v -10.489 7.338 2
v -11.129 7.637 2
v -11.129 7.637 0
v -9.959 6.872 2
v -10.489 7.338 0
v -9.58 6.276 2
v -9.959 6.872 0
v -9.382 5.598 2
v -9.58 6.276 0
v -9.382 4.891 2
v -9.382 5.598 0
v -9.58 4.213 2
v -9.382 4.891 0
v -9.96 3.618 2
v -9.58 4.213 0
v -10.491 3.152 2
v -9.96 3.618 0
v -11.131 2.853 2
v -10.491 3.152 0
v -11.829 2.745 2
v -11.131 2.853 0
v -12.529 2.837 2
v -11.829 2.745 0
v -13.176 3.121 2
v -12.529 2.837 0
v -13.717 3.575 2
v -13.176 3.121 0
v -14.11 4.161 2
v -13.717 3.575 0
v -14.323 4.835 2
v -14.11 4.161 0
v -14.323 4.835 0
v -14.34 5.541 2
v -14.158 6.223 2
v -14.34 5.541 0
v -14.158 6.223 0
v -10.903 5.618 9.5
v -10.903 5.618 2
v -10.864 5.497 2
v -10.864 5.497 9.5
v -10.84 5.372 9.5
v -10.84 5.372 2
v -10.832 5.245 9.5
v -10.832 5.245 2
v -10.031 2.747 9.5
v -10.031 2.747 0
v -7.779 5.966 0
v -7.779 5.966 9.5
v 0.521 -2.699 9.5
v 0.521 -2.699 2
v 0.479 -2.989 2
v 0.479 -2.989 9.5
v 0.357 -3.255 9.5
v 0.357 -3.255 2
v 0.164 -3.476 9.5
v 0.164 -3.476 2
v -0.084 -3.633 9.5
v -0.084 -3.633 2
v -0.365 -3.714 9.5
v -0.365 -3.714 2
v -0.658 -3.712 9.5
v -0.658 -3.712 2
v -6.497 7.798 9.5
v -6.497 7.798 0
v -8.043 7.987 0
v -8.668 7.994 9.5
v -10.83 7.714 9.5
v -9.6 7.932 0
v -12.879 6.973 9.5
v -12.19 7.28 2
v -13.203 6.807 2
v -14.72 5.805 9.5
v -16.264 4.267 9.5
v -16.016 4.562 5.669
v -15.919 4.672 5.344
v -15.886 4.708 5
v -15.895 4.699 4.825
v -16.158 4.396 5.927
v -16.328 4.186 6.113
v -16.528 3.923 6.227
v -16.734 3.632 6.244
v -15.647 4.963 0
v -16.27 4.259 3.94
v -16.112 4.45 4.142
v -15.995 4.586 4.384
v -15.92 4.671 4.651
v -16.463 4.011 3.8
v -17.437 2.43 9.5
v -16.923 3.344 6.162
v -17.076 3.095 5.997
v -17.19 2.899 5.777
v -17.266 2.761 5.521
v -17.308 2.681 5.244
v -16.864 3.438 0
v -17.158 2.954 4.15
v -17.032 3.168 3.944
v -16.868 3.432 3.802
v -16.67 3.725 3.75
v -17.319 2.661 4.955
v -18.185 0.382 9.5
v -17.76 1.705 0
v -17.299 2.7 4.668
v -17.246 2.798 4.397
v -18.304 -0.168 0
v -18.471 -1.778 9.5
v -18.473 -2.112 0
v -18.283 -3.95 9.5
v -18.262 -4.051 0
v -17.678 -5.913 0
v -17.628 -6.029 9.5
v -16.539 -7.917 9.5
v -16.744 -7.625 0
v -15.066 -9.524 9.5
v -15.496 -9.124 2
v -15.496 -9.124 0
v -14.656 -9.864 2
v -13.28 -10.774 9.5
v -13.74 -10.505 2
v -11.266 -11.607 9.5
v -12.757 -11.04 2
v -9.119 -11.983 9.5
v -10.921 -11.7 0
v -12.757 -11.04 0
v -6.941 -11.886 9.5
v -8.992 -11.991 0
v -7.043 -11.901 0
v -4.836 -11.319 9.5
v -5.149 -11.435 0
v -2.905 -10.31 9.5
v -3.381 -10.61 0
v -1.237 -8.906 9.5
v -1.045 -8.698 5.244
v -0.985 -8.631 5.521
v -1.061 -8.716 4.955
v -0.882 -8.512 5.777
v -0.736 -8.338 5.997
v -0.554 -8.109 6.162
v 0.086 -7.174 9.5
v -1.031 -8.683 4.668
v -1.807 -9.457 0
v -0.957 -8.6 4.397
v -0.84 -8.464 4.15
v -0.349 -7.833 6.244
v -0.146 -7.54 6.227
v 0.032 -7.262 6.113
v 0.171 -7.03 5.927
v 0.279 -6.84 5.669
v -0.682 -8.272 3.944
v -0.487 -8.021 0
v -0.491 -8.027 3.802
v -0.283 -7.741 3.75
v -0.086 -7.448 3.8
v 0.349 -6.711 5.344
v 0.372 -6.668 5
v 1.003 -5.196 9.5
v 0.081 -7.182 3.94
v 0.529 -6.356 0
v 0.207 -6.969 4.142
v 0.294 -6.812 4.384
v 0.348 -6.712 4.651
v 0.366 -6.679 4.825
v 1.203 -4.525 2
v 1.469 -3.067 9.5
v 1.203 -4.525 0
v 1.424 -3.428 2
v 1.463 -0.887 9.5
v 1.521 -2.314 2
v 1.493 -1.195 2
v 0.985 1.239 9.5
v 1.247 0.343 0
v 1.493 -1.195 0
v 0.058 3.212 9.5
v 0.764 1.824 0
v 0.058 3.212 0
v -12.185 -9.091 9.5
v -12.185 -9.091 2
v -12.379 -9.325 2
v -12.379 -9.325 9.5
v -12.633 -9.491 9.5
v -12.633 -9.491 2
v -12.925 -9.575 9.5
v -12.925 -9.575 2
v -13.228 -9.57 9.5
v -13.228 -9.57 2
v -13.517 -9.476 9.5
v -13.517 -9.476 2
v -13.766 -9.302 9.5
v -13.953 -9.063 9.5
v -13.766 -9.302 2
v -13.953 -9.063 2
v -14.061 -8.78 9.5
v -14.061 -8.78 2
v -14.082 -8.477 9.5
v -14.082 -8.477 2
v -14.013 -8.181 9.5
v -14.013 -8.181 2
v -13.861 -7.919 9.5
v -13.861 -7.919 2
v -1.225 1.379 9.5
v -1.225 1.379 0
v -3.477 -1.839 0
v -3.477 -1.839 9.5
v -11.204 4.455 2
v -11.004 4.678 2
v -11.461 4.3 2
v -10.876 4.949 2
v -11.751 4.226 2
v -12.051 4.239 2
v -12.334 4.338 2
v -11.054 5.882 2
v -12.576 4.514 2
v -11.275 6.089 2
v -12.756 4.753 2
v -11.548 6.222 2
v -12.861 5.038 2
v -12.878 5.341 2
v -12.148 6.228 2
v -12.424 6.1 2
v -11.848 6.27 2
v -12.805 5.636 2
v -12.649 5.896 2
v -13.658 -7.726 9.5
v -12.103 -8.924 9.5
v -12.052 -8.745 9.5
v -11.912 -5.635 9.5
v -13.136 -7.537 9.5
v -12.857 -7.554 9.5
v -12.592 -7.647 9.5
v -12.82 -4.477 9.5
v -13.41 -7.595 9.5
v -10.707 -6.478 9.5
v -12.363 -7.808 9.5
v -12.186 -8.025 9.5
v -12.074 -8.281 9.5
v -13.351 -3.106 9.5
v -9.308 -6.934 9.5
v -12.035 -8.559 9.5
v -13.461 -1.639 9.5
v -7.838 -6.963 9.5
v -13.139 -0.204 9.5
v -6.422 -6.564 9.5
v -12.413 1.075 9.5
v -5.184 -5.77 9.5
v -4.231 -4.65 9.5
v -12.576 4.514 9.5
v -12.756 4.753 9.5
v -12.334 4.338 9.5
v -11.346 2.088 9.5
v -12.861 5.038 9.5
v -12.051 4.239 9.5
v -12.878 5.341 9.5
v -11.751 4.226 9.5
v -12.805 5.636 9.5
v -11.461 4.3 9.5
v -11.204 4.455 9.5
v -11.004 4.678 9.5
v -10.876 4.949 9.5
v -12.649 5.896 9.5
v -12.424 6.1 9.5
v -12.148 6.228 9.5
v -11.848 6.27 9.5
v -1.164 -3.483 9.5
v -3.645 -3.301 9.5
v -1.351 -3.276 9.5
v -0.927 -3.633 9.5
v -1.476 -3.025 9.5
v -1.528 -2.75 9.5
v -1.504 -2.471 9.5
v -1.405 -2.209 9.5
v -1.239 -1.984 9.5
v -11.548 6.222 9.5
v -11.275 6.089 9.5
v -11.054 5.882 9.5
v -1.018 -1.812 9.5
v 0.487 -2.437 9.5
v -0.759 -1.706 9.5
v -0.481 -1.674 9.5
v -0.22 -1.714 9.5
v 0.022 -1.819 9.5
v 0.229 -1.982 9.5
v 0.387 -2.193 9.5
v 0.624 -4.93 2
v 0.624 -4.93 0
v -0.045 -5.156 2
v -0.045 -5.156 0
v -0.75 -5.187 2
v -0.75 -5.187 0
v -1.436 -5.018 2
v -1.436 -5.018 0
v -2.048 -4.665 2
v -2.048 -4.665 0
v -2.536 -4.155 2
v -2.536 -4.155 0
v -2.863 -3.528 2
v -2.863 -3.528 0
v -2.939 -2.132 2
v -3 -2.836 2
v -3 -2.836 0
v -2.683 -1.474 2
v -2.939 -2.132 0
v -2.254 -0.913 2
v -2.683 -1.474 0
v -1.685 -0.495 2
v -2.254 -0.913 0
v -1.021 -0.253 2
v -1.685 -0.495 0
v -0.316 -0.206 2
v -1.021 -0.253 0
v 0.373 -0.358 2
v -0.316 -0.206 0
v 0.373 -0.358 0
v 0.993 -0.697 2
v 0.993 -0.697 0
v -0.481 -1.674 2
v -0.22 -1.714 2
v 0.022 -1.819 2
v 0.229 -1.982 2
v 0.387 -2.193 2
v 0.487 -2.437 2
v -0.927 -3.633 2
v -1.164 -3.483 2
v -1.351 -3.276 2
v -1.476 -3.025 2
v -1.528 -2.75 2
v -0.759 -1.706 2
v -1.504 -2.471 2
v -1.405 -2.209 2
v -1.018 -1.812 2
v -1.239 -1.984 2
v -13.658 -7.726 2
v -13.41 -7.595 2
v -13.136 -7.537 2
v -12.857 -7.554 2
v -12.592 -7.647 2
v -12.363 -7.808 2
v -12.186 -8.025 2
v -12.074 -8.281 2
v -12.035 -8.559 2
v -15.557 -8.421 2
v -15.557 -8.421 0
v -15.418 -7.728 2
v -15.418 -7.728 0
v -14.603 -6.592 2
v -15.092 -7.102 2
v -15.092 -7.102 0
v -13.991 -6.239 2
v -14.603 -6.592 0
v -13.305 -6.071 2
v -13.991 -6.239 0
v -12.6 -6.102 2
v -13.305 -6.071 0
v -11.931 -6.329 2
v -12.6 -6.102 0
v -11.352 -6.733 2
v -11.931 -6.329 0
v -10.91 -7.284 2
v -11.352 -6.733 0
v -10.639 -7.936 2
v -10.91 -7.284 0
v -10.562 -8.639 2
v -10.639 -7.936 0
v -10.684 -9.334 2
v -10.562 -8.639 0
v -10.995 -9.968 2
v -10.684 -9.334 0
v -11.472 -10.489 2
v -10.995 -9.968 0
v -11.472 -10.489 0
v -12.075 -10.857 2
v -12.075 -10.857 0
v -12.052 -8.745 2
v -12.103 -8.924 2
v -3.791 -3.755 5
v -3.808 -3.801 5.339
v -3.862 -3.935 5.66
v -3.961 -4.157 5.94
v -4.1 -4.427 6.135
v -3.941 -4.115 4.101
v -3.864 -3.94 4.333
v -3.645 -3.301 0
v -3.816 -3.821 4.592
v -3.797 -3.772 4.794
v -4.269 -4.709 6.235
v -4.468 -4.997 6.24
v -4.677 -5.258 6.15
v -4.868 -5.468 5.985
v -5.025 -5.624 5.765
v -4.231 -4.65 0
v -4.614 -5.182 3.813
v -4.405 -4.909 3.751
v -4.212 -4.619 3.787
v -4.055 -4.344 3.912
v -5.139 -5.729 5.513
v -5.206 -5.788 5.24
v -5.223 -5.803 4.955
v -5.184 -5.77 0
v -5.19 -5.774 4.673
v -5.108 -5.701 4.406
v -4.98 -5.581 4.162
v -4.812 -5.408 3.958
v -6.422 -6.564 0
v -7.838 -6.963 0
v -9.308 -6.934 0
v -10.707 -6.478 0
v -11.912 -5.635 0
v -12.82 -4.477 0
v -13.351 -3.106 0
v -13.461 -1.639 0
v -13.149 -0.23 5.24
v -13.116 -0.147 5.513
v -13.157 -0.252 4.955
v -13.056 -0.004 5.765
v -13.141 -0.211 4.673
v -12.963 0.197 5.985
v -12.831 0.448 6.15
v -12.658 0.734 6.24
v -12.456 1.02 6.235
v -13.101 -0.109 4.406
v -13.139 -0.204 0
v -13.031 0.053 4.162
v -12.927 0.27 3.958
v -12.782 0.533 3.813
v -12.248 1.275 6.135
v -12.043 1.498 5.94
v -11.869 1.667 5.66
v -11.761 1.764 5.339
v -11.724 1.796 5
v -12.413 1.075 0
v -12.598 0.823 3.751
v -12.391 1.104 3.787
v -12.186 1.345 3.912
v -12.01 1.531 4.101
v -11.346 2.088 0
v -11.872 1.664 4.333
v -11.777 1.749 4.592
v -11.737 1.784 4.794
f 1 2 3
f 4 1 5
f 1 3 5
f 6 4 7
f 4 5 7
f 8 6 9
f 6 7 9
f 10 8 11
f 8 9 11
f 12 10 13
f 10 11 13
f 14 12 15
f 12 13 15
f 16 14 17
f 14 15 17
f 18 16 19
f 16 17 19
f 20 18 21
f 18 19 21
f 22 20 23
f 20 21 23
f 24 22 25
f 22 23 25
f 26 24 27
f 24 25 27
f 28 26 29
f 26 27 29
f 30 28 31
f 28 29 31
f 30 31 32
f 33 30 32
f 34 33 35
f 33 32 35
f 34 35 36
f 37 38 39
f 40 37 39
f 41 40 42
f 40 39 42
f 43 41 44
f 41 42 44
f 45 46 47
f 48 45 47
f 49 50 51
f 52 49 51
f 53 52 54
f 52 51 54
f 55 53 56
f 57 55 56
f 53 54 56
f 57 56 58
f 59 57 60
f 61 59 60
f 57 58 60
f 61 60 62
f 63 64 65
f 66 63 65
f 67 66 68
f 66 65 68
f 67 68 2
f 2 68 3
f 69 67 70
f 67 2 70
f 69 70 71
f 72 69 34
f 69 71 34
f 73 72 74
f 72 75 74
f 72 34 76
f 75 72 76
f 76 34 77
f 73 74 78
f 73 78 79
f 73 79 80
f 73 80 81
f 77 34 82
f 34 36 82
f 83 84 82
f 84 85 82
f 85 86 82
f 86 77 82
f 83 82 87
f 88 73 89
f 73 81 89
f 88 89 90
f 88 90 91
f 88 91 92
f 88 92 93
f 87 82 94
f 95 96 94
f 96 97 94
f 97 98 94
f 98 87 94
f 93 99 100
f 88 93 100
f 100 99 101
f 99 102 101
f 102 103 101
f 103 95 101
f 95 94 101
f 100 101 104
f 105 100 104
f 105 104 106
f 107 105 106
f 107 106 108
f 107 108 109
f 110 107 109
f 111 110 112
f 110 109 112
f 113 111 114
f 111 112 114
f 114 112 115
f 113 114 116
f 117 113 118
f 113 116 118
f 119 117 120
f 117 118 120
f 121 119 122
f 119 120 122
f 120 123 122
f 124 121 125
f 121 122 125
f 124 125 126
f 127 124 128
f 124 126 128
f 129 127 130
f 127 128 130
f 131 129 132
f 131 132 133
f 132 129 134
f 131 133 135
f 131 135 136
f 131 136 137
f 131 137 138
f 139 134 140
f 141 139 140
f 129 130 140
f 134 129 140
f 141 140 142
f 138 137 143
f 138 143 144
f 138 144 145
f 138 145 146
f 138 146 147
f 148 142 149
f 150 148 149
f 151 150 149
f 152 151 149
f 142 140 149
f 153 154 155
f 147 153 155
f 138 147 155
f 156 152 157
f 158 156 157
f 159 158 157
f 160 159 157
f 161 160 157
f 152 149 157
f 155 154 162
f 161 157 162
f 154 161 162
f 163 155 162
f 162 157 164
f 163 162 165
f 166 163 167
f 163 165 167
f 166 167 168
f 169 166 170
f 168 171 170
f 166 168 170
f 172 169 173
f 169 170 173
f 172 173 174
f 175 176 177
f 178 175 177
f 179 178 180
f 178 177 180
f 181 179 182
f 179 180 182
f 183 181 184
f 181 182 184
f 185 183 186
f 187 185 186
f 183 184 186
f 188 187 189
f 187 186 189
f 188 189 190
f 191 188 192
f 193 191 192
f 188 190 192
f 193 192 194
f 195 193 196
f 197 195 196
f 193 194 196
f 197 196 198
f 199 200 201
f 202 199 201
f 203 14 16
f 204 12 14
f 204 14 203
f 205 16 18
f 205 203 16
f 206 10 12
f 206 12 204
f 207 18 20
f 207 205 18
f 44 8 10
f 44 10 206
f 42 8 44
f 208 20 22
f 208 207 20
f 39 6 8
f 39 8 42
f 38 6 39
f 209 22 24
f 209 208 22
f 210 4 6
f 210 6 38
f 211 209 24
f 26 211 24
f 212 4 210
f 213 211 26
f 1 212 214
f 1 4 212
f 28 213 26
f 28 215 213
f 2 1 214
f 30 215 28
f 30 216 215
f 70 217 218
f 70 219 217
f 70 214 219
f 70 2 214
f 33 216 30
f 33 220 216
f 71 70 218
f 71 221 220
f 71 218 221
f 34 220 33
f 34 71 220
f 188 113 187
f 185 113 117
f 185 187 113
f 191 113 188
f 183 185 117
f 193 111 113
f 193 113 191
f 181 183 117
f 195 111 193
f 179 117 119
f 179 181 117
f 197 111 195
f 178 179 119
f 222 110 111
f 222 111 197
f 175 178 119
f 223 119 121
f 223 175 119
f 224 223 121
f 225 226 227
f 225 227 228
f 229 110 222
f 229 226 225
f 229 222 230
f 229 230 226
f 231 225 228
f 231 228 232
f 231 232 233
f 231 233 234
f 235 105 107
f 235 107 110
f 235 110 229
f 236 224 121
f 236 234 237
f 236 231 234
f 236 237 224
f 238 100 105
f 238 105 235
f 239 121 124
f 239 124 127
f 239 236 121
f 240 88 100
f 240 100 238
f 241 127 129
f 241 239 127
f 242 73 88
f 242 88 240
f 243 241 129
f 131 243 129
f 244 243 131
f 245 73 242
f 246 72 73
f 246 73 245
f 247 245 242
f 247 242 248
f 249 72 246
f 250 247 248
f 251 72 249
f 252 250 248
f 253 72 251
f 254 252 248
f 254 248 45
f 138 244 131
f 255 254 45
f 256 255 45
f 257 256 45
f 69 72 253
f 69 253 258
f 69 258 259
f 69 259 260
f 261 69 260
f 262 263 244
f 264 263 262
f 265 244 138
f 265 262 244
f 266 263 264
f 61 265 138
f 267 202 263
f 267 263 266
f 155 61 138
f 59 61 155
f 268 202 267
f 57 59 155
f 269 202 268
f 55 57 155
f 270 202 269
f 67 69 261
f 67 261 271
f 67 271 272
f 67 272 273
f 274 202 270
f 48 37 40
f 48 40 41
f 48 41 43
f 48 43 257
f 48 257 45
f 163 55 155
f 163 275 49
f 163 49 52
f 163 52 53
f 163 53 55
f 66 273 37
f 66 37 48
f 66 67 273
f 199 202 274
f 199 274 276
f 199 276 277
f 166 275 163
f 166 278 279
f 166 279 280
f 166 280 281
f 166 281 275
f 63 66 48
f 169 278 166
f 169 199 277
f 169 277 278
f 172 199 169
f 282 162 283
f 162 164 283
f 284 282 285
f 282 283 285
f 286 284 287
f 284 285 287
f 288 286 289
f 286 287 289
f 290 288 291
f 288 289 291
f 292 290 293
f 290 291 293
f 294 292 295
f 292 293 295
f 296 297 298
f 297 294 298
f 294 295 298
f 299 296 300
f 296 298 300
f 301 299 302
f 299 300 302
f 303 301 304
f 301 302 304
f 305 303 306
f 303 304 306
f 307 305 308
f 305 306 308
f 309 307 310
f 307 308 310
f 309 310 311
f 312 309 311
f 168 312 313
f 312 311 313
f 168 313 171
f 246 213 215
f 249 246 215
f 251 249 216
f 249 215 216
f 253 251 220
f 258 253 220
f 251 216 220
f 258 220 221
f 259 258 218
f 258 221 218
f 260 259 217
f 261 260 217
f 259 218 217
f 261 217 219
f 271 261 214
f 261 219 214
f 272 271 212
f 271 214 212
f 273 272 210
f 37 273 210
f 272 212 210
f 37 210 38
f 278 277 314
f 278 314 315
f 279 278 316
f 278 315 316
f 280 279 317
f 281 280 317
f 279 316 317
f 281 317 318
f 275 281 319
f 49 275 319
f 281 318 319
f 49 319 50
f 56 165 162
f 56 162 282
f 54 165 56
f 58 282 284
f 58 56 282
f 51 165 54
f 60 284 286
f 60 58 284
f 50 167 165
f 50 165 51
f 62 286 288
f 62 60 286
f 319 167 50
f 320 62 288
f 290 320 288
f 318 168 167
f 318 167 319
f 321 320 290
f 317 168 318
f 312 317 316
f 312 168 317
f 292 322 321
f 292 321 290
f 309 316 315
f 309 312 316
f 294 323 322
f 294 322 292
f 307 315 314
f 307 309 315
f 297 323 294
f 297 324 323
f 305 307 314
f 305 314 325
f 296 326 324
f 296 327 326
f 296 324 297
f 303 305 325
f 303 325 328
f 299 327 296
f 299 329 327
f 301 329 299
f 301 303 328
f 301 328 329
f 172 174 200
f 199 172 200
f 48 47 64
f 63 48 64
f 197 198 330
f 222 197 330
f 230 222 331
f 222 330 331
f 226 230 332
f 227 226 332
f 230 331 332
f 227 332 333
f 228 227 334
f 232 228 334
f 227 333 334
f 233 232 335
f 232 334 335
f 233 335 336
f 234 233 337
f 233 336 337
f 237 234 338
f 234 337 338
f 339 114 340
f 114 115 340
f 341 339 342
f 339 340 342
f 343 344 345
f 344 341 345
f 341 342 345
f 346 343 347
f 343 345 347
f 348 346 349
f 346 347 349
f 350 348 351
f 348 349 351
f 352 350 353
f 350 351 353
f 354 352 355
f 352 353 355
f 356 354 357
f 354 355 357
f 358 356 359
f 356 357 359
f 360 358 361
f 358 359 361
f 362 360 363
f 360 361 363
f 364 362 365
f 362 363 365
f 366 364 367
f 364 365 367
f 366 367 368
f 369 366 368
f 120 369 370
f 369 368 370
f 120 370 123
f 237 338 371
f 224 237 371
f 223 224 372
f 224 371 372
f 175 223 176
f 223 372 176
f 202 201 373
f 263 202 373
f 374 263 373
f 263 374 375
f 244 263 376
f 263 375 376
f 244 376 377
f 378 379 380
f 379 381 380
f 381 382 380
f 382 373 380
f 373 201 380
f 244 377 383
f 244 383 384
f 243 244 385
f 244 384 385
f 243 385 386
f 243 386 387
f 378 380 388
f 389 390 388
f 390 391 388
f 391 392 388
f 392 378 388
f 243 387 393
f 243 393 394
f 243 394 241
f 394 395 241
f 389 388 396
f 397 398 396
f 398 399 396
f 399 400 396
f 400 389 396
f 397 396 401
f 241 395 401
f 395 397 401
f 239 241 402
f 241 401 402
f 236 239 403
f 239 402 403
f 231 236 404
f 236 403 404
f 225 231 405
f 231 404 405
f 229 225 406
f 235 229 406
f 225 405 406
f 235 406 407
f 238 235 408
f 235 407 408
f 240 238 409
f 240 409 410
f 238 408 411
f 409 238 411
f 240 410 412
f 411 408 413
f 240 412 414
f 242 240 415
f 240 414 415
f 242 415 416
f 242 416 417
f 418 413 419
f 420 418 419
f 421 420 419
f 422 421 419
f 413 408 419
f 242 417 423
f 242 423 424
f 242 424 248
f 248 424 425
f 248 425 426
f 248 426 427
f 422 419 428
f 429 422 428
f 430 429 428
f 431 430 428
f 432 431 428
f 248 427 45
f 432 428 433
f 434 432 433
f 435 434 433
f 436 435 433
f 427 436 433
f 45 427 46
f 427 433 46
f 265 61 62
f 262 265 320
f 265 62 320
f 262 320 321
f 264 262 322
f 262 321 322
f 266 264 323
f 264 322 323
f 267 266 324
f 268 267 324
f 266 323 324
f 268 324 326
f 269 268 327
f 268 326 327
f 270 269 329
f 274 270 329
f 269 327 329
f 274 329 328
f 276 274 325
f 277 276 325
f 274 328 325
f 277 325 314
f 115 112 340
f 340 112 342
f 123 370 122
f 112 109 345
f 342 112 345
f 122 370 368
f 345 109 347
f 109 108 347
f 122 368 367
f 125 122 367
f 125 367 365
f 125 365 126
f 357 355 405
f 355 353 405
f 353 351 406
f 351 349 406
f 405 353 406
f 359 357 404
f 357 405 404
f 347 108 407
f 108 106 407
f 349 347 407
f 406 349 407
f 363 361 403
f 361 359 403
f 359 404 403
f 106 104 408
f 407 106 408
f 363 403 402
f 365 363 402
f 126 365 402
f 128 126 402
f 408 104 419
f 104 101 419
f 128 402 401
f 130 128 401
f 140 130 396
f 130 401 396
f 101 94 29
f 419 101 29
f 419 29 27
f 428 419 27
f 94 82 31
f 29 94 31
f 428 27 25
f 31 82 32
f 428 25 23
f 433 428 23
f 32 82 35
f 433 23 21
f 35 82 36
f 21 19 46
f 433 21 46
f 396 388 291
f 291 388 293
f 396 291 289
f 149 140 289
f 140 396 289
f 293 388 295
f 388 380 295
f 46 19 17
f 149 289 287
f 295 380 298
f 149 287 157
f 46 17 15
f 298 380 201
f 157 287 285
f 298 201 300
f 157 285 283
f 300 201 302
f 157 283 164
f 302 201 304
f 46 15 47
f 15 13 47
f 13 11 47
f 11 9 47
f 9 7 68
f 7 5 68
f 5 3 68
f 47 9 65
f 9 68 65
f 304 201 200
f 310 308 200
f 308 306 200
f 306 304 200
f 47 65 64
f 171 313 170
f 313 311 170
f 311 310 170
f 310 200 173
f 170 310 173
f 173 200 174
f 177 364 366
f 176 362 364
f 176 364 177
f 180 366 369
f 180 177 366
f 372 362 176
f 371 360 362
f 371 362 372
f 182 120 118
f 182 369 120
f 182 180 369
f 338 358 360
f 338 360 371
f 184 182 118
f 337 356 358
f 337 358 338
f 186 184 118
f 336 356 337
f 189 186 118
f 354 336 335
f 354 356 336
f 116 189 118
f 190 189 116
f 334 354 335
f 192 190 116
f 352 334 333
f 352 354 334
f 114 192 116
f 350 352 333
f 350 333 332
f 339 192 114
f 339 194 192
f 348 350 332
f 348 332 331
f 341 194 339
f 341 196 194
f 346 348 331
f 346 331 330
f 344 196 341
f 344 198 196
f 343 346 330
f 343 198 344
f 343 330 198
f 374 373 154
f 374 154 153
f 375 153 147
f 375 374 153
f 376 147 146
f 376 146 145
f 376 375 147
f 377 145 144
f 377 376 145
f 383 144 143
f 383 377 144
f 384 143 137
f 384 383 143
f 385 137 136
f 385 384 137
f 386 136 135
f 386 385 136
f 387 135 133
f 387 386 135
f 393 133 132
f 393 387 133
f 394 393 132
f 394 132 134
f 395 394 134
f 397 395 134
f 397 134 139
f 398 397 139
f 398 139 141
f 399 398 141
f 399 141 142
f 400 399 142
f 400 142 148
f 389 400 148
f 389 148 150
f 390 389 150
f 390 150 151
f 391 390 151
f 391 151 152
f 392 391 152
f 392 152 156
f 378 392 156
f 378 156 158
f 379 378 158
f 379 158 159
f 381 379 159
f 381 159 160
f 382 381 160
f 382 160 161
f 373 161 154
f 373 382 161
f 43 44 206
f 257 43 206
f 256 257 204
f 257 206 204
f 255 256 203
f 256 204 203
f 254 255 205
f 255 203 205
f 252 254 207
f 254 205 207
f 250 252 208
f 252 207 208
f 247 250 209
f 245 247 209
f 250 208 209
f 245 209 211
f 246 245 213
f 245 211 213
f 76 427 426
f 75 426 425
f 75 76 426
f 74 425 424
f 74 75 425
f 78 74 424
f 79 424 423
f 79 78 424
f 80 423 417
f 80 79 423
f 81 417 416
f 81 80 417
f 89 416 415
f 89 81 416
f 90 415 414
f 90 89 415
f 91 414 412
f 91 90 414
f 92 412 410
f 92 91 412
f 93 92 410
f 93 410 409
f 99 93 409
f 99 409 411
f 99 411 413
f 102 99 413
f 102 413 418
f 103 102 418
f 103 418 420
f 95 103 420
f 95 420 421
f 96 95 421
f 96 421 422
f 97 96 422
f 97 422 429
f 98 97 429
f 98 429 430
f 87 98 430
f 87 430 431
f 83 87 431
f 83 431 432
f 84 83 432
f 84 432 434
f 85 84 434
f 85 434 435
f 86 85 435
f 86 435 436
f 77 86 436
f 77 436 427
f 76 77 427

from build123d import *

# Parameters (mm, degrees)
BOSS_EXTRUDE2_DEPTH     = 9.5
CUT_EXTRUDE2_DEPTH      = 27.058535816
CUT_EXTRUDE2_DEPTH_BACK = 27.058535816
SKETCH5_R               = 1.25
SKETCH6_R               = 2.5
CUT_EXTRUDE9_DEPTH      = 2


with BuildPart() as part:
    # Sketch1 → Boss-Extrude2 (new body)
    with BuildSketch(Plane.XY):
        with BuildLine():
            ThreePointArc((-10.902610273, 5.618325714), (-9.358197978, 5.946861897), (-7.779340218, 5.965664362))
            Line((-7.779340218, 5.965664362), (-6.496881129, 7.798486163))
            ThreePointArc((-6.496881129, 7.798486163), (-14.207044336, -10.197524815), (0.057841359, 3.212026405))
            Line((0.057841359, 3.212026405), (-1.224617731, 1.379204604))
            ThreePointArc((-1.224617731, 1.379204604), (-0.701306814, -0.110523909), (-0.480783057, -1.674018275))
            ThreePointArc((-0.480783057, -1.674018275), (0.228827523, -1.982287772), (0.52081643, -2.698751126))
            ThreePointArc((0.52081643, -2.698751126), (0.163849564, -3.476154966), (-0.658416217, -3.71208093))
            ThreePointArc((-0.658416217, -3.71208093), (-5.090643329, -9.253473613), (-12.184684972, -9.091476058))
            ThreePointArc((-12.184684972, -9.091476058), (-13.648069553, -9.398668012), (-13.860882426, -7.918609902))
            ThreePointArc((-13.860882426, -7.918609902), (-16.443755706, -1.309492285), (-12.756440886, 4.753129216))
            ThreePointArc((-12.756440886, 4.753129216), (-12.290784632, 6.174053415), (-10.902610273, 5.618325714))
        make_face()
        with BuildLine():
            ThreePointArc((-3.476685985, -1.839330652), (-11.340506987, -6.10082326), (-10.031408473, 2.747129106))
            Line((-10.031408473, 2.747129106), (-7.779340218, 5.965664362))
            ThreePointArc((-7.779340218, 5.965664362), (-9.358197978, 5.946861897), (-10.902610273, 5.618325714))
            ThreePointArc((-10.902610273, 5.618325714), (-10.850027906, 5.435061947), (-10.832295948, 5.245230202))
            ThreePointArc((-10.832295948, 5.245230202), (-11.60332603, 4.252192297), (-12.756440886, 4.753129216))
            ThreePointArc((-12.756440886, 4.753129216), (-16.443755706, -1.309492285), (-13.860882426, -7.918609902))
            ThreePointArc((-13.860882426, -7.918609902), (-12.721194489, -7.591608608), (-12.035429397, -8.558844193))
            ThreePointArc((-12.035429397, -8.558844193), (-12.073448385, -8.835418744), (-12.184684972, -9.091476058))
            ThreePointArc((-12.184684972, -9.091476058), (-5.090643329, -9.253473613), (-0.658416217, -3.71208093))
            ThreePointArc((-0.658416217, -3.71208093), (-1.52531241, -2.609751731), (-0.480783057, -1.674018275))
            ThreePointArc((-0.480783057, -1.674018275), (-0.701306814, -0.110523909), (-1.224617731, 1.379204604))
            Line((-1.224617731, 1.379204604), (-3.476685985, -1.839330652))
        make_face()
    extrude(amount=BOSS_EXTRUDE2_DEPTH)

    # Sketch5 → Cut-Extrude2 (cut, two sides: drawn at the far end of the back side and taken through both)
    with BuildSketch(Plane(origin=(3.446074086, -2.411281355, 0), x_dir=(0, 0, -1), z_dir=(0.8193403109233307, -0.5733074697717271, 0)).offset(-CUT_EXTRUDE2_DEPTH_BACK)):
        with Locations(Location((-5, -6.500247794, 0), (0, 0, 90))):
            Circle(SKETCH5_R)
    extrude(amount=CUT_EXTRUDE2_DEPTH + CUT_EXTRUDE2_DEPTH_BACK, mode=Mode.SUBTRACT)

    # Sketch6 → Cut-Extrude9 (cut)
    with BuildSketch(Plane(origin=(0, 0, 0), x_dir=(-1, 0, 0), z_dir=(0, 0, -1))):
        with Locations((0.50418357, -2.698751126)):
            Circle(SKETCH6_R)
        with Locations((13.060429397, -8.558844193)):
            Circle(SKETCH6_R)
        with Locations((11.857295948, 5.245230202)):
            Circle(SKETCH6_R)
    extrude(amount=-CUT_EXTRUDE9_DEPTH, mode=Mode.SUBTRACT)


solid = part.part
